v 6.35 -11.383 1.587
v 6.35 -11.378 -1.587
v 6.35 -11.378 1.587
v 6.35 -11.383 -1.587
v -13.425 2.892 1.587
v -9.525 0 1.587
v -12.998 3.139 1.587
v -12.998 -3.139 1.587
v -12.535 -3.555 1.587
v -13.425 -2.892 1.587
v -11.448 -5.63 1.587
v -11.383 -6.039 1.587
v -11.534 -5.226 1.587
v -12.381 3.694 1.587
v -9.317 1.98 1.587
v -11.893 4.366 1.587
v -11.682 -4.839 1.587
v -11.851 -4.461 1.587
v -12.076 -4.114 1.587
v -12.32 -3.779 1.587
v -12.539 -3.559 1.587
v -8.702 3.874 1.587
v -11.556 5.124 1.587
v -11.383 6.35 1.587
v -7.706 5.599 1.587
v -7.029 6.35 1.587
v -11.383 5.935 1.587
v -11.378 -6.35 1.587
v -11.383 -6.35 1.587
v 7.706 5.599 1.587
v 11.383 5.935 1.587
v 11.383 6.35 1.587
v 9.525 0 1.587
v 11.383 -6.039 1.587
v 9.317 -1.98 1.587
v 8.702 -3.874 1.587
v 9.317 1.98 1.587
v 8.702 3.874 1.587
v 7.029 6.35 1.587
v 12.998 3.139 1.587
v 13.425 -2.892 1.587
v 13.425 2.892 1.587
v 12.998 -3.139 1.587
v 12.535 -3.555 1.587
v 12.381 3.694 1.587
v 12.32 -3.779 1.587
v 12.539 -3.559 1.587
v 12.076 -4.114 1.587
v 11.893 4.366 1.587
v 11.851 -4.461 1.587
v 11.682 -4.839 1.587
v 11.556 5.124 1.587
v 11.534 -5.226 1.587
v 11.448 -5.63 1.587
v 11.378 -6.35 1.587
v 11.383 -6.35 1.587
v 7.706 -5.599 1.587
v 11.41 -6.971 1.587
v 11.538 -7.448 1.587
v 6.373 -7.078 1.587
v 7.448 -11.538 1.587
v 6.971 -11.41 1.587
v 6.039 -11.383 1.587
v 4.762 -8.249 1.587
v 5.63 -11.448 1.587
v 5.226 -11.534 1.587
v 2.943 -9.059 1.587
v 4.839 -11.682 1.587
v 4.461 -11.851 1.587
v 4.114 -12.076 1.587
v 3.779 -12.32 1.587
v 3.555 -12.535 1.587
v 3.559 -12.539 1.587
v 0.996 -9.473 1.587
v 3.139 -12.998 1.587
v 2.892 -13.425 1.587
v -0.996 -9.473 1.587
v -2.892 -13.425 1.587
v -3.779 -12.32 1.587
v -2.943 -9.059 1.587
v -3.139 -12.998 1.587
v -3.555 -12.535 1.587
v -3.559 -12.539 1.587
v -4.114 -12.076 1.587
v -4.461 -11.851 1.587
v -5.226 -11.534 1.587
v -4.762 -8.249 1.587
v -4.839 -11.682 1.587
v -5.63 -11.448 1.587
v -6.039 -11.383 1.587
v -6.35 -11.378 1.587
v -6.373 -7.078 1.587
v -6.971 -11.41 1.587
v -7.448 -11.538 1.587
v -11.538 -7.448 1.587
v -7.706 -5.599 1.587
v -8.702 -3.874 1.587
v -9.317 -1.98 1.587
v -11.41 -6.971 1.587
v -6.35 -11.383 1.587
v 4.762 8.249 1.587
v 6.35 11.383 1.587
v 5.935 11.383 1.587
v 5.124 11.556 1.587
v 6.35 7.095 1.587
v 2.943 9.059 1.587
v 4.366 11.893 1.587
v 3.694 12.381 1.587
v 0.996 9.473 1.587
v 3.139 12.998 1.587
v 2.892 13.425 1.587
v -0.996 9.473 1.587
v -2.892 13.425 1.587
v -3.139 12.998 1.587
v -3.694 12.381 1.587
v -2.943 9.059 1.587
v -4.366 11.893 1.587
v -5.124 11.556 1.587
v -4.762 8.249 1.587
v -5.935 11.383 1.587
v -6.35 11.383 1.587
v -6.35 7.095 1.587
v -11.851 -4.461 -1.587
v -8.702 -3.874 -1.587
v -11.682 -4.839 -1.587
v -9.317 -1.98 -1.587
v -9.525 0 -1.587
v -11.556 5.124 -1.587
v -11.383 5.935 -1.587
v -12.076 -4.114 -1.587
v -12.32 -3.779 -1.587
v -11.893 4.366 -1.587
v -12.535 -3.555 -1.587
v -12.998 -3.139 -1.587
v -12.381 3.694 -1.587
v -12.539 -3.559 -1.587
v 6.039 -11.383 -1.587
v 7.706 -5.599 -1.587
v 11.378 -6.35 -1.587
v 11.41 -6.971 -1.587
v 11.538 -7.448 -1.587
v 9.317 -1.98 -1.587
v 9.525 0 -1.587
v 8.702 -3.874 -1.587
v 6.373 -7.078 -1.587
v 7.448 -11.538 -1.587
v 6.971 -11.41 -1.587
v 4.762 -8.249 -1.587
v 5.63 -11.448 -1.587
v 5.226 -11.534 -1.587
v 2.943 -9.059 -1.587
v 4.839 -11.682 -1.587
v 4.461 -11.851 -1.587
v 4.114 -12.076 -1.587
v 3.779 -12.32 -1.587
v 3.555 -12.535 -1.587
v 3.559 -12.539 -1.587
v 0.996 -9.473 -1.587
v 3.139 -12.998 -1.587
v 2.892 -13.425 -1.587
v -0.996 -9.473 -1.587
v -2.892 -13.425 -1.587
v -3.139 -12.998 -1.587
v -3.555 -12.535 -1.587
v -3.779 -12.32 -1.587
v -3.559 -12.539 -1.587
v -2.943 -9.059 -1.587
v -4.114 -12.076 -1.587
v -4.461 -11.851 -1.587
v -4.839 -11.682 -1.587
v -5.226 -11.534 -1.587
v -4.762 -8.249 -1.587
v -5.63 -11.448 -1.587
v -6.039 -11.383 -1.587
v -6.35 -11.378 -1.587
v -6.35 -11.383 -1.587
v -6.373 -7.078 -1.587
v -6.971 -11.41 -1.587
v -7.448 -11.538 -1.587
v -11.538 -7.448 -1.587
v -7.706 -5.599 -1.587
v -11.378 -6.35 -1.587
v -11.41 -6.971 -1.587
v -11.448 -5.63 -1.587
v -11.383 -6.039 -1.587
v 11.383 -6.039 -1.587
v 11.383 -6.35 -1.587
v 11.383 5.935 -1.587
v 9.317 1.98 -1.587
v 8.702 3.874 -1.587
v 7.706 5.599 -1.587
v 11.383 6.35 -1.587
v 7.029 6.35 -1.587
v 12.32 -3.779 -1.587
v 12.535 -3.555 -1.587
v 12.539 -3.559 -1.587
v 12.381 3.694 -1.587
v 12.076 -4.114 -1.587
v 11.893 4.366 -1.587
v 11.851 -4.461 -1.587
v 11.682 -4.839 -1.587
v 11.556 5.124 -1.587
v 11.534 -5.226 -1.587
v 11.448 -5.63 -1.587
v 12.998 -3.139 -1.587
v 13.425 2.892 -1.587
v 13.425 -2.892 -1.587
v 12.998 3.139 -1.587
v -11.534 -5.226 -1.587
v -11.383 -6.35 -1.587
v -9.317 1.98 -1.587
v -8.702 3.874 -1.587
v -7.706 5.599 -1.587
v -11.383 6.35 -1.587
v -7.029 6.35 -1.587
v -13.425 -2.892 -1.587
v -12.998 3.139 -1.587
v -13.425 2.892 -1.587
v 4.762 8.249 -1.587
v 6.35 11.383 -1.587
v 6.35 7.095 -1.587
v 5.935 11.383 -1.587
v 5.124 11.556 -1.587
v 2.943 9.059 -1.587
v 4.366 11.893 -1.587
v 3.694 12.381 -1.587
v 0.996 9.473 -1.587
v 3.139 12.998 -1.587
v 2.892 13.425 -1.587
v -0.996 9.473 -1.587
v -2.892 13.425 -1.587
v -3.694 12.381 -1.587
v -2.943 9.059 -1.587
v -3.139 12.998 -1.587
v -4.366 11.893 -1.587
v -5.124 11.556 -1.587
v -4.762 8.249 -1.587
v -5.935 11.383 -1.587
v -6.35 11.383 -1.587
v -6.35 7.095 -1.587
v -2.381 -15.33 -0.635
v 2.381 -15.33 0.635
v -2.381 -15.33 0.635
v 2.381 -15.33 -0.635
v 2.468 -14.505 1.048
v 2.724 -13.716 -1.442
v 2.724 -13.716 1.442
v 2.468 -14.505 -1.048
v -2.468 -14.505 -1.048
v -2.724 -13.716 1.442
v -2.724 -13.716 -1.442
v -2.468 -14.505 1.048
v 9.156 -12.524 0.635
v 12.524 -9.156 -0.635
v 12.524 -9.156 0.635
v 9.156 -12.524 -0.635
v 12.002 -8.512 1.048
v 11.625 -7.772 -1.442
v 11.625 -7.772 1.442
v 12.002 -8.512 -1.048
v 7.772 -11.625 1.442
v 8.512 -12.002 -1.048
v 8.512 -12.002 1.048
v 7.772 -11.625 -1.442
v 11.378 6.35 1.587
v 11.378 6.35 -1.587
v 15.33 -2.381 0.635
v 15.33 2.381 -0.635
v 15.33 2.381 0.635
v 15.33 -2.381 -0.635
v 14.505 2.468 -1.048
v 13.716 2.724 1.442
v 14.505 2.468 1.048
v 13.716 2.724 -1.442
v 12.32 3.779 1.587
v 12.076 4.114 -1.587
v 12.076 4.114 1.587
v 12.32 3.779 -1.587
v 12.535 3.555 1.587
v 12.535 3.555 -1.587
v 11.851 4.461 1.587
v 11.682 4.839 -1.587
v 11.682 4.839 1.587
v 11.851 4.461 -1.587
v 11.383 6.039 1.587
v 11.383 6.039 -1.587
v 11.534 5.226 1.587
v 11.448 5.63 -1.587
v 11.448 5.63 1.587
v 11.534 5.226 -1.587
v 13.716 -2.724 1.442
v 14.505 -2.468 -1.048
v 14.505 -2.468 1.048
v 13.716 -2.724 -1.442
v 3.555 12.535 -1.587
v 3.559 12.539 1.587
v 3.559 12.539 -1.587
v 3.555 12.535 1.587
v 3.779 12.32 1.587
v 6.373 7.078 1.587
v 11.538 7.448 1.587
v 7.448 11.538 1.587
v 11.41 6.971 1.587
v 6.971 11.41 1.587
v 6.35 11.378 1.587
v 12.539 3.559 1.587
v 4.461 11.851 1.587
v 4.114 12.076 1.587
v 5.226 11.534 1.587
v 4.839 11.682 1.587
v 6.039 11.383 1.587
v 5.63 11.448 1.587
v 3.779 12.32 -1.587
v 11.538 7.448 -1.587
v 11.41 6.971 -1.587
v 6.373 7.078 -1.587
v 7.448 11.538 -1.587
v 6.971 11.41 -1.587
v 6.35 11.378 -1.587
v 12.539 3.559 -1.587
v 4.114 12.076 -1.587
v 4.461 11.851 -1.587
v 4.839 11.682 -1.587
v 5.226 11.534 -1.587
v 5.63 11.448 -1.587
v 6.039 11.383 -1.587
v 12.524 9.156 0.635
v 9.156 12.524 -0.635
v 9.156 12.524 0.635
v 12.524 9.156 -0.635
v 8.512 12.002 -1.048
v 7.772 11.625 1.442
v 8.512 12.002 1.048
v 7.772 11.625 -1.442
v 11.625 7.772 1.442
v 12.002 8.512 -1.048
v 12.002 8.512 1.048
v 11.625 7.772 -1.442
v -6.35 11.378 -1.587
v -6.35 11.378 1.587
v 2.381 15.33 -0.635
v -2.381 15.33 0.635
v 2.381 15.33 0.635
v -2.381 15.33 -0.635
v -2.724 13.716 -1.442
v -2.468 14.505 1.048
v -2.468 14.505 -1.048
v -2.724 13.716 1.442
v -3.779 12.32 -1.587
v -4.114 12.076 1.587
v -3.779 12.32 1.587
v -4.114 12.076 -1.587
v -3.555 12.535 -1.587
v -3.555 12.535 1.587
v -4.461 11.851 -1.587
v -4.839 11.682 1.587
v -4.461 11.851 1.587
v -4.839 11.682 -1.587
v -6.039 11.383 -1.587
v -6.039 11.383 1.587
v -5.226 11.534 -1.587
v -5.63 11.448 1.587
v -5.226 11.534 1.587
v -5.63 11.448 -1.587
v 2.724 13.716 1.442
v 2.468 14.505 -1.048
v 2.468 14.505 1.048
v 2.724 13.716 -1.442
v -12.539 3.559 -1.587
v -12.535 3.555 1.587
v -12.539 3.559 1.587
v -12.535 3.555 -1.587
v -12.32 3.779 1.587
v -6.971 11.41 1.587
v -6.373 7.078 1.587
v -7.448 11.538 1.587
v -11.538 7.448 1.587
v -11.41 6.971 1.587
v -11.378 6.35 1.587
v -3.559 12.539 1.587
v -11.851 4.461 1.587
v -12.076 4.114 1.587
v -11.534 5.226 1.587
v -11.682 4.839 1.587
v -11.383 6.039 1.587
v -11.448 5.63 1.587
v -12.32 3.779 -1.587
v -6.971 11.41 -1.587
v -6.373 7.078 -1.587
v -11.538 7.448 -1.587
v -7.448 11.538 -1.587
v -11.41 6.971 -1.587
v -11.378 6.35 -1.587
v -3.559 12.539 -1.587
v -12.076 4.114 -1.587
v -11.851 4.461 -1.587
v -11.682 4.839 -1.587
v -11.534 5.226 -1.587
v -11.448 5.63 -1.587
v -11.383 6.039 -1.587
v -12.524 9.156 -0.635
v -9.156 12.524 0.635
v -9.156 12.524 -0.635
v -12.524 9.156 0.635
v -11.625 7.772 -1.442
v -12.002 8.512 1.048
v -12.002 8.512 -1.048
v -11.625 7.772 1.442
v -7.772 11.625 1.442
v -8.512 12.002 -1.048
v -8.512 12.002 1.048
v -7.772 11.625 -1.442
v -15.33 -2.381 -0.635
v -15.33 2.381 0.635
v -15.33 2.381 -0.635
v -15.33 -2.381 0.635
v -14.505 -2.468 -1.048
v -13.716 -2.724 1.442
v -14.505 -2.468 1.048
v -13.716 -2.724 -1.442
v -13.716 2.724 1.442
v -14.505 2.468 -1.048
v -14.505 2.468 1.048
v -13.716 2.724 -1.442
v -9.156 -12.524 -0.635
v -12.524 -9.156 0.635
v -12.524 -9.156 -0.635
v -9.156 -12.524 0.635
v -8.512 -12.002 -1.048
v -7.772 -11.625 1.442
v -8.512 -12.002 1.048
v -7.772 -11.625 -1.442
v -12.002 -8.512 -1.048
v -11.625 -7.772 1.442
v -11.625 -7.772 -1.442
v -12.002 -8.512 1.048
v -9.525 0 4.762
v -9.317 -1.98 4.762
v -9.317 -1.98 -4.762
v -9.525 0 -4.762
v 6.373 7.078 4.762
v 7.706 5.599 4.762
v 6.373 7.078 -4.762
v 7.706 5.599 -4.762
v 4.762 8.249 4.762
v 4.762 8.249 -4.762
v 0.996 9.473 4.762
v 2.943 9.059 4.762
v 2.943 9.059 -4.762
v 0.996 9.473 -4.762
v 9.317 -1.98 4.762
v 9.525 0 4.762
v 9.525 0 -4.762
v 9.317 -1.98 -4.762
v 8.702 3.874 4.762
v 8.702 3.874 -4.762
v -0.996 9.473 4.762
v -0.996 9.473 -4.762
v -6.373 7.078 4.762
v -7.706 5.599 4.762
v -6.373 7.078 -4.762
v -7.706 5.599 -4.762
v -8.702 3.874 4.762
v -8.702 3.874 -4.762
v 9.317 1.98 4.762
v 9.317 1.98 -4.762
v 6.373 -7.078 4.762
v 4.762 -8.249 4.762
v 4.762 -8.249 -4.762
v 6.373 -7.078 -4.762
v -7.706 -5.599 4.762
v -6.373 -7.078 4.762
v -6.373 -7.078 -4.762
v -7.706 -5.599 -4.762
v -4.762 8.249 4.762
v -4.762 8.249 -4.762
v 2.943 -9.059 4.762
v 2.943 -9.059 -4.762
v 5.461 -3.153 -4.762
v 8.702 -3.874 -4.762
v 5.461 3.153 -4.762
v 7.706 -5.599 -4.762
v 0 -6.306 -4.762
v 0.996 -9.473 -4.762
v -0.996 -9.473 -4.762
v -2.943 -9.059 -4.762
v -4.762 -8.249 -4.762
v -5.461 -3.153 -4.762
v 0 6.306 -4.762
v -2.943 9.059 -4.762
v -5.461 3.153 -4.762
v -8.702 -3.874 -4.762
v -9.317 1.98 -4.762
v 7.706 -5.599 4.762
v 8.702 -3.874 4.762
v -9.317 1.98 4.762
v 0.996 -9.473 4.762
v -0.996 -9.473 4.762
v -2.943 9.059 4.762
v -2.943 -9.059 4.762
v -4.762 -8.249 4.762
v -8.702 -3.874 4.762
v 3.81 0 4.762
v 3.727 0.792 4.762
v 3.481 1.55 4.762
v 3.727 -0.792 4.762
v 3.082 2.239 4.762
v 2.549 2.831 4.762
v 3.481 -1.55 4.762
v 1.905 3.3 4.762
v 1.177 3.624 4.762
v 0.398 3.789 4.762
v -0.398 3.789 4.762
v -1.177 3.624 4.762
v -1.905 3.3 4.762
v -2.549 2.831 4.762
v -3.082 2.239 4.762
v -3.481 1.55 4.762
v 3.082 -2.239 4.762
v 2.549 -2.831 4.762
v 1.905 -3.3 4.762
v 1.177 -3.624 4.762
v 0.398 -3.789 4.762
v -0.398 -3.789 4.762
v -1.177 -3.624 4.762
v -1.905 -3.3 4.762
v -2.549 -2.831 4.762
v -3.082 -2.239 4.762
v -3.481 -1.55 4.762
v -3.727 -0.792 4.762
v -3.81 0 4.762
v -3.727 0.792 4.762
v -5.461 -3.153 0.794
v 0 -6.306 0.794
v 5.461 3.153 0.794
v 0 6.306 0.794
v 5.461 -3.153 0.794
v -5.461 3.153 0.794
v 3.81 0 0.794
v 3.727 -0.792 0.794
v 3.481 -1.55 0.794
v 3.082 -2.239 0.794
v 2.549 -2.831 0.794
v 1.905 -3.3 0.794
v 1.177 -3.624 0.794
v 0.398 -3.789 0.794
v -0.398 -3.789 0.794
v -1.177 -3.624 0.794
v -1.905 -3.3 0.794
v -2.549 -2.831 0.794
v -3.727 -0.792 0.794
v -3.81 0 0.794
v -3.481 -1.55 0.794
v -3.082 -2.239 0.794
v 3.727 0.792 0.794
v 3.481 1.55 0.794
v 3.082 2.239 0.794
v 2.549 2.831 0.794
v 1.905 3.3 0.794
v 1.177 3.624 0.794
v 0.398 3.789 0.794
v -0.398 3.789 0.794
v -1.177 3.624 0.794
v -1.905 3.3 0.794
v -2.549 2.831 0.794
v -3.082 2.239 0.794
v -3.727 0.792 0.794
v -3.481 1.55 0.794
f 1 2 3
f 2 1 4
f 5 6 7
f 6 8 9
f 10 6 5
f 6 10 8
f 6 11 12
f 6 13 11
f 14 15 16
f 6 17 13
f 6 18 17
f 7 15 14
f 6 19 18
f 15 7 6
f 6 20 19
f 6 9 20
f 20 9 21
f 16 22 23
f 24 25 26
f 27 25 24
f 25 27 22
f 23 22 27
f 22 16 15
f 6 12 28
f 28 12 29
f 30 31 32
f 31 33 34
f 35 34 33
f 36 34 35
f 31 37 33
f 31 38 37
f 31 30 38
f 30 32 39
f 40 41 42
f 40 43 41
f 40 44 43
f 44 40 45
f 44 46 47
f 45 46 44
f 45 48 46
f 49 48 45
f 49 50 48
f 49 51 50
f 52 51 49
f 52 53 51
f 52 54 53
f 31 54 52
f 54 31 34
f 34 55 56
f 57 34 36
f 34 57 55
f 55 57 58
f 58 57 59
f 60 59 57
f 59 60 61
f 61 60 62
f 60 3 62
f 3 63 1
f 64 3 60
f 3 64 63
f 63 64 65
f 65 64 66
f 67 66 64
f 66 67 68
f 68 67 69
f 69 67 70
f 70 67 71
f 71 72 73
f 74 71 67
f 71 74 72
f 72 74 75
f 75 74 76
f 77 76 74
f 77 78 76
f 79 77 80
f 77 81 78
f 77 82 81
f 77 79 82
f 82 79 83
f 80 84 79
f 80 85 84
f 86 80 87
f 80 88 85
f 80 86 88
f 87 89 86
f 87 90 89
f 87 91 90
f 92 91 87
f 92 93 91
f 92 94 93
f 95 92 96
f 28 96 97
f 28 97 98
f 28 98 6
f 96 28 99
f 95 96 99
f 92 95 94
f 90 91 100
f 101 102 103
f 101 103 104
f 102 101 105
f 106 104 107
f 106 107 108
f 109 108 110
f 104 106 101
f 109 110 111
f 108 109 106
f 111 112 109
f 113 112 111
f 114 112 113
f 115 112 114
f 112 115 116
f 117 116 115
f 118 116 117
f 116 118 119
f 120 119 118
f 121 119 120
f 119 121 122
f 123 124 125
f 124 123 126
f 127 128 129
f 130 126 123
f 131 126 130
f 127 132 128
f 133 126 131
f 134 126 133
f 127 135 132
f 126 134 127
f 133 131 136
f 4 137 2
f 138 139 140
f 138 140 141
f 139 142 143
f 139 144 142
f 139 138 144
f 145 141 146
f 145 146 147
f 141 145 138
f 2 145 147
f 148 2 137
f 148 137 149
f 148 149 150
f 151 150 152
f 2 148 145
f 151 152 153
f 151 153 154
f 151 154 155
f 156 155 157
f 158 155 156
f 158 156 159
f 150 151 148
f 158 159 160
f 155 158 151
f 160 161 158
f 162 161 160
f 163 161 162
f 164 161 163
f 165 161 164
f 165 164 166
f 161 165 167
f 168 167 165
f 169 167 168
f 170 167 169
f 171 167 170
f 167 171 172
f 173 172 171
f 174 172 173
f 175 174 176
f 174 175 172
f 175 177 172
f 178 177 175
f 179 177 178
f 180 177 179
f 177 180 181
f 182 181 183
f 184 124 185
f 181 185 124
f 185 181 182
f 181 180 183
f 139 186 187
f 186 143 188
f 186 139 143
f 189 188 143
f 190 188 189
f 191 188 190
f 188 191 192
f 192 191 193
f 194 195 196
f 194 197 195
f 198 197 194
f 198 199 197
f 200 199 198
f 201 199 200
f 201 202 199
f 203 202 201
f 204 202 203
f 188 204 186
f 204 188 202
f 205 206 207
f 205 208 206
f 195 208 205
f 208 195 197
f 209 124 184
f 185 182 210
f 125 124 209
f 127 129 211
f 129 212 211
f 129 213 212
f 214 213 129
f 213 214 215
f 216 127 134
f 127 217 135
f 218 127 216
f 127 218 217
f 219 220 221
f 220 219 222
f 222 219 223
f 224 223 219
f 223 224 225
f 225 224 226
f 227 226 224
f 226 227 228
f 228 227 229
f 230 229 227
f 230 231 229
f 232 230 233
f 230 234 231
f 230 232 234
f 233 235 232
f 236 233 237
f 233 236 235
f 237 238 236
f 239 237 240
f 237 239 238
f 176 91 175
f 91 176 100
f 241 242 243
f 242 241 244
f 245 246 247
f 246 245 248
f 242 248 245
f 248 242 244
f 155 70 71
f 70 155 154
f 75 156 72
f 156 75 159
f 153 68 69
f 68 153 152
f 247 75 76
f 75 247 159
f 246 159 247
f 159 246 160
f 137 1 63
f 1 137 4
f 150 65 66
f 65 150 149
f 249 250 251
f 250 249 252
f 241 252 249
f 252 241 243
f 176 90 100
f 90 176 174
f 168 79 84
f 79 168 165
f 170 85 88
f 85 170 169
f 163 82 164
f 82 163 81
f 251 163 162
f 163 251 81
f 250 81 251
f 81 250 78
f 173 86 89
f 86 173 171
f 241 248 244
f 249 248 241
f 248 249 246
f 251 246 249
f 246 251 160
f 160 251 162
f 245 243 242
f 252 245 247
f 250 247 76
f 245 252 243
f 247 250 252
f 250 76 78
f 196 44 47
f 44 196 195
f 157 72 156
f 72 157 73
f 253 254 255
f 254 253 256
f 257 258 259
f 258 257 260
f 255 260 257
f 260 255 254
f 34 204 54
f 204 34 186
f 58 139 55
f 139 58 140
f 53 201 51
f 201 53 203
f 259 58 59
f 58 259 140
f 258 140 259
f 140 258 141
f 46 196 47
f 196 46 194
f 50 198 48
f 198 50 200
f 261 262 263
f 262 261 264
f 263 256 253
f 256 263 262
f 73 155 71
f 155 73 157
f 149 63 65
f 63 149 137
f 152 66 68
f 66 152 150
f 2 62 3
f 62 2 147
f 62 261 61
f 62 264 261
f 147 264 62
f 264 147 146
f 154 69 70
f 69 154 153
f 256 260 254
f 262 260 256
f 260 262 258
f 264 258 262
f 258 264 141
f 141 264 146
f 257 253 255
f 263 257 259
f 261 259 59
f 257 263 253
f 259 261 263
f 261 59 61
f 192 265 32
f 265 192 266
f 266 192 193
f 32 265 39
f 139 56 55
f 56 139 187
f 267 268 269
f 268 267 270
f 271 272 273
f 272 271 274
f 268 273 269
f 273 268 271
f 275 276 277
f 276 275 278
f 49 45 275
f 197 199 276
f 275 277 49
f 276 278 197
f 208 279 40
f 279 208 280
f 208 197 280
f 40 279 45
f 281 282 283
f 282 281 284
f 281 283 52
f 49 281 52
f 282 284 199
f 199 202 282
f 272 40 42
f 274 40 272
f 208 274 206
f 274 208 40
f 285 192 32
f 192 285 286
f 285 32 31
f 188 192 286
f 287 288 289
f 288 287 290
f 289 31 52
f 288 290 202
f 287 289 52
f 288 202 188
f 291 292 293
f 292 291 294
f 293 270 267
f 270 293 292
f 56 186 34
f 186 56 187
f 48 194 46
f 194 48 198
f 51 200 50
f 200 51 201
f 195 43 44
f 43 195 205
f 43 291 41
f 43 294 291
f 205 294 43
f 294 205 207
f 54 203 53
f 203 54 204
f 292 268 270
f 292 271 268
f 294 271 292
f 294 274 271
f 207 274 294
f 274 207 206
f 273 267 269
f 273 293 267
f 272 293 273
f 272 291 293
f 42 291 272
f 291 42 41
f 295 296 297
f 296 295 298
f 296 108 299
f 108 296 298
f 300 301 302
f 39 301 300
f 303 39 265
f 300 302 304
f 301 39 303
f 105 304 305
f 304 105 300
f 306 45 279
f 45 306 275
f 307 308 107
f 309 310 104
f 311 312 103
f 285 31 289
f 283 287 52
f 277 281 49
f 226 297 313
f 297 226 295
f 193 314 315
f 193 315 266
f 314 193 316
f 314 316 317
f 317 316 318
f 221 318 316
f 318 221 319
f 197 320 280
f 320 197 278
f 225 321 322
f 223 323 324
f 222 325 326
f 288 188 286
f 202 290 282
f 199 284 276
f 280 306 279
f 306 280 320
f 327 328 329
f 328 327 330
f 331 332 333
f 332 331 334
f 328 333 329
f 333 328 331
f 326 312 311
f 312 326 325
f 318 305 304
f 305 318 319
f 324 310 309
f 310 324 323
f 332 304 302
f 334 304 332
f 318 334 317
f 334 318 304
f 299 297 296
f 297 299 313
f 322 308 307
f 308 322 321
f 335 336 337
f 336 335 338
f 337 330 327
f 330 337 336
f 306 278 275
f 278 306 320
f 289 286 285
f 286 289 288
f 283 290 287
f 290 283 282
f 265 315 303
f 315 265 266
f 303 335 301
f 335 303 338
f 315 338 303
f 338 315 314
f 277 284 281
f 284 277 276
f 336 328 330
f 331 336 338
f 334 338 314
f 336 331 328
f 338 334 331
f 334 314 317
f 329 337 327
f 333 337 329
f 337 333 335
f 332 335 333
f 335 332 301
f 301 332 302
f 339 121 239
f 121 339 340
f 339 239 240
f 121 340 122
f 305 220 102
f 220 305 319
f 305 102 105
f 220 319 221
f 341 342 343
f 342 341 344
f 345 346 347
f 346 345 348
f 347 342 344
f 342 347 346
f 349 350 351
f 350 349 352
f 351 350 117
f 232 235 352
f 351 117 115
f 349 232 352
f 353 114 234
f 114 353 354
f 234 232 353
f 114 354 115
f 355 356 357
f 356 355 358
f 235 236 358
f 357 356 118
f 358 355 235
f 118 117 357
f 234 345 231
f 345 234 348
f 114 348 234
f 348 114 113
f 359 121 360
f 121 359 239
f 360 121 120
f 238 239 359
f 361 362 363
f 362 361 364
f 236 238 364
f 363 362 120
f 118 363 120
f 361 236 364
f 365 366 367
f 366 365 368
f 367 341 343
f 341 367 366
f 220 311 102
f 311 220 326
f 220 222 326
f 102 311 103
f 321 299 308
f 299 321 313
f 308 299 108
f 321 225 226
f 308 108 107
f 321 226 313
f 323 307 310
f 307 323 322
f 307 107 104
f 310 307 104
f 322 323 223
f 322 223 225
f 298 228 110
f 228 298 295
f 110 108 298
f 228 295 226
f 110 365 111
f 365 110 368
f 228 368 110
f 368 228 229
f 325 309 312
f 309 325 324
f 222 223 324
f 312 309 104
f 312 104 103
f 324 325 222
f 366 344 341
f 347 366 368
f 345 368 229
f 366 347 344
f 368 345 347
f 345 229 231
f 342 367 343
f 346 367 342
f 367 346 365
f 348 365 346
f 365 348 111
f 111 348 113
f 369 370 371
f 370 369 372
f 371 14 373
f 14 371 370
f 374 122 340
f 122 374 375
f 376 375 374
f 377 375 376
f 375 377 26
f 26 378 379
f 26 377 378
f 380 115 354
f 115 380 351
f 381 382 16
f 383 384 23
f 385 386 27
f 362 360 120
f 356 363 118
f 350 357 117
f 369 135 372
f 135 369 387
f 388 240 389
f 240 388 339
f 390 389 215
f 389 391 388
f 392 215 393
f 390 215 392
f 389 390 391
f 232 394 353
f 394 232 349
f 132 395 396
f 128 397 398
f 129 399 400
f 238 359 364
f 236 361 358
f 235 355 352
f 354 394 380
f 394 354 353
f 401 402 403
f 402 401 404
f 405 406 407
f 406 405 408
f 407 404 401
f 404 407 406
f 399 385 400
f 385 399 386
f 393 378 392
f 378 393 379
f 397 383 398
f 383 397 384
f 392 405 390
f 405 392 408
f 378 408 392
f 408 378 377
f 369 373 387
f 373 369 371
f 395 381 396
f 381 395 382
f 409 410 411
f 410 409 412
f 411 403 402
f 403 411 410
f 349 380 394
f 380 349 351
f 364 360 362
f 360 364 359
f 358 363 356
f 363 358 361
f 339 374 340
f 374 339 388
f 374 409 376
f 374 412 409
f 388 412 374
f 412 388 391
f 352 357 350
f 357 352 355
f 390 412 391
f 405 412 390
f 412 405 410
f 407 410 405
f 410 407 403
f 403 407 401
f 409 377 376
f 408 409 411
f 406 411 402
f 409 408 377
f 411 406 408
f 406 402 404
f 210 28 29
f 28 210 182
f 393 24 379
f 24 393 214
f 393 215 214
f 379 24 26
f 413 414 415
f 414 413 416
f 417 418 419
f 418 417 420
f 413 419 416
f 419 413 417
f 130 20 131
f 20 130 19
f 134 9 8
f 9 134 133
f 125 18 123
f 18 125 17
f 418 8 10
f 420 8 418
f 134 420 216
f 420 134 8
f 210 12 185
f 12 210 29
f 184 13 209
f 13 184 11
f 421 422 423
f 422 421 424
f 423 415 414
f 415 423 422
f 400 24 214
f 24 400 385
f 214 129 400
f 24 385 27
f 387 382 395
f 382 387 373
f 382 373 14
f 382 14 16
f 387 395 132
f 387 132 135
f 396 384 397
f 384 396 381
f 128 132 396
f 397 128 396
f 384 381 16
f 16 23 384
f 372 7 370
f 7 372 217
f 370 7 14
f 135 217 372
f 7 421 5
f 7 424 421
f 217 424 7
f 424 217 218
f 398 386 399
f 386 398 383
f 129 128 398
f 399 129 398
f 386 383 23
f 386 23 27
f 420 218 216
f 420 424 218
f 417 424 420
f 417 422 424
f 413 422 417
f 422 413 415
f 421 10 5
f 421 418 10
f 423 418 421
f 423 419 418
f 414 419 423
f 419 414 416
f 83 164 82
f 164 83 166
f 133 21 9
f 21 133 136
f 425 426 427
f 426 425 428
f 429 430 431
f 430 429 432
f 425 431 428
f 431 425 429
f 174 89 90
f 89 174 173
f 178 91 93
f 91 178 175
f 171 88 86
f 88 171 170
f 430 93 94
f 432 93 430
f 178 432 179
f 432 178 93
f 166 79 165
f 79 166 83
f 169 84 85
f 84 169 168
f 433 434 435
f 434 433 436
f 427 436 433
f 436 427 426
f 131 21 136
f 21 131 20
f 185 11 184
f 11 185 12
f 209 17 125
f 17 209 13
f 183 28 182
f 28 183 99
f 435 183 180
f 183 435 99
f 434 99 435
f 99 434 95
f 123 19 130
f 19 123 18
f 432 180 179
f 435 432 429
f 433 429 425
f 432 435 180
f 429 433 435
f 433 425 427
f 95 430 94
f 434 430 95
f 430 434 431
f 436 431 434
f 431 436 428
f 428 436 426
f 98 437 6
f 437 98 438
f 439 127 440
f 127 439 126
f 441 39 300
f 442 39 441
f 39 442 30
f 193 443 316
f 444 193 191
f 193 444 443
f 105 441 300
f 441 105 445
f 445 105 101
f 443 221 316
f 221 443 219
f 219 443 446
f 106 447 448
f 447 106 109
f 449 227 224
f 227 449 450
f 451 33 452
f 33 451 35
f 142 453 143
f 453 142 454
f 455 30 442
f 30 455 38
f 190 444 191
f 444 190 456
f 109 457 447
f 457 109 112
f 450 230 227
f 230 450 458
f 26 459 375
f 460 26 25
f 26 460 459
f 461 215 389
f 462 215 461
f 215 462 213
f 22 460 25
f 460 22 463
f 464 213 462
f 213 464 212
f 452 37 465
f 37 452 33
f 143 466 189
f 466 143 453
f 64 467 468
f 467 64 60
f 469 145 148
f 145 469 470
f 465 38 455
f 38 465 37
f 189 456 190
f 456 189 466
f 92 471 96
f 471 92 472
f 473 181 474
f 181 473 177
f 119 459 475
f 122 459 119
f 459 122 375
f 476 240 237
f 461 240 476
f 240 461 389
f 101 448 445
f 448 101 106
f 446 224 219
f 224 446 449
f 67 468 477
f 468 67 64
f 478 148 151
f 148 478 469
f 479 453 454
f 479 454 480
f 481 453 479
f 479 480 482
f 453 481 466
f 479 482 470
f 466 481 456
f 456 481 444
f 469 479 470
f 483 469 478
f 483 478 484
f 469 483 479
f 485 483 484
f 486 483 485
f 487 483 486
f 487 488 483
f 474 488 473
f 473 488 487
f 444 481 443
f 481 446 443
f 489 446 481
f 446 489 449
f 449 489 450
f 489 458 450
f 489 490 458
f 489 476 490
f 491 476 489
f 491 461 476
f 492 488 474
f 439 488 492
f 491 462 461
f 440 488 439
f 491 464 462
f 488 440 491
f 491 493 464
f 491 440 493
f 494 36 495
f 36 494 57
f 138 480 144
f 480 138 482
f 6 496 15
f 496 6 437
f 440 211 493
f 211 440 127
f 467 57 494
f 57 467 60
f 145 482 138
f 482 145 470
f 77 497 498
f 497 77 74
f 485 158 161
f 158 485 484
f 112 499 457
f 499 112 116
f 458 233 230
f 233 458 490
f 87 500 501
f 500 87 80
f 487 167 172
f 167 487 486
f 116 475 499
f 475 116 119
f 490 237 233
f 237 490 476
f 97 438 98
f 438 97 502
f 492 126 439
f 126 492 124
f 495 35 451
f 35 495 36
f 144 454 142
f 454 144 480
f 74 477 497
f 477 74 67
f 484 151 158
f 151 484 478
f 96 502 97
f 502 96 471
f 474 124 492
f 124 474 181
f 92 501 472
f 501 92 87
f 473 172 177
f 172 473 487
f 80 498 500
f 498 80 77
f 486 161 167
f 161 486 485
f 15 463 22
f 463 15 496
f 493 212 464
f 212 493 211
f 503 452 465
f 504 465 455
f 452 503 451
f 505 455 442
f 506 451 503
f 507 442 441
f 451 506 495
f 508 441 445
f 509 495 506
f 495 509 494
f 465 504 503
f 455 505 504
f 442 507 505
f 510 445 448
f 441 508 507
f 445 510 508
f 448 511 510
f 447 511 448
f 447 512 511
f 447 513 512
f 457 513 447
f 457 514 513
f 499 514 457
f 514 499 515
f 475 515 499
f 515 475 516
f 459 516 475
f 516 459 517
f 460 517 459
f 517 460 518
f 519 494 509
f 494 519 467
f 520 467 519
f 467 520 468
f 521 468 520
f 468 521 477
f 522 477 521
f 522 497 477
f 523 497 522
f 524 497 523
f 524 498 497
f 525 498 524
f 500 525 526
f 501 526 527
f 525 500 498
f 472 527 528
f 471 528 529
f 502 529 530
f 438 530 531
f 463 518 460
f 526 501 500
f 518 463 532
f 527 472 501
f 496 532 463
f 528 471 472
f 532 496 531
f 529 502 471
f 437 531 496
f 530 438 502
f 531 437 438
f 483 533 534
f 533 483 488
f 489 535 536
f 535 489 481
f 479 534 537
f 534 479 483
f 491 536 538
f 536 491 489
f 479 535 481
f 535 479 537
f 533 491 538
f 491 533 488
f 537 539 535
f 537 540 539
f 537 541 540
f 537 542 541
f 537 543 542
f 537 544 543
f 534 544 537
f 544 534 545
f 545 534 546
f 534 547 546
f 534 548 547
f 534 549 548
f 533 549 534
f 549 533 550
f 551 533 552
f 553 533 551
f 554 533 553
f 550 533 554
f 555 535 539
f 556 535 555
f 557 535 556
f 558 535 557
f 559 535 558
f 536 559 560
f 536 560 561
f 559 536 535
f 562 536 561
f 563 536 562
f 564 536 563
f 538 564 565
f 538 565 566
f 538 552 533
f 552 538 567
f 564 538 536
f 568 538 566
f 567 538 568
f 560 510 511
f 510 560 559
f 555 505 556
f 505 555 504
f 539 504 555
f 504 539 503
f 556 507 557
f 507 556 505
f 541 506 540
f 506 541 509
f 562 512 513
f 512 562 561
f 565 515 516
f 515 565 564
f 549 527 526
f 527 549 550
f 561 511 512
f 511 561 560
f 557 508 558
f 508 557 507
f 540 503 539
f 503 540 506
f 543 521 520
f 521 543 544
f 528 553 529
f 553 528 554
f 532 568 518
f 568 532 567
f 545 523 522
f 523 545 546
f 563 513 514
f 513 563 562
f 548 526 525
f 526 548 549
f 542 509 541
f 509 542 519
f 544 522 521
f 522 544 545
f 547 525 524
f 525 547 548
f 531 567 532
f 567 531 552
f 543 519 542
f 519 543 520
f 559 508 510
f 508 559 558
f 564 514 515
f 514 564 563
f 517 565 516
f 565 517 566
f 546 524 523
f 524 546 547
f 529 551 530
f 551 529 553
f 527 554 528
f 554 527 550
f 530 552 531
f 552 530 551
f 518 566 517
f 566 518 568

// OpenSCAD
/* http://www.thingiverse.com/thing:426854 */

module sprocket_tooth() {
    s = 1;
    intersection() {
        difference() {
            translate([-1/4,0,-1/16])
                cube([1/2,3/8,1/8]);
            translate([1/4, 0, -1/8])
                cylinder(h=1/4, d=5/16, $fn=30);
            translate([-1/4, 0, -1/8])
                cylinder(h=1/4, d=5/16, $fn=30);
        }
        translate([0, -0.05, 0])
            scale([1, 1, 0.5])
                rotate([-45, 0, 0])
                    translate([-1/2, 0, 0])
                        cube([1, 1, 1]);
    }
}

module sprocket(teeth, hub_diameter) {
    pitch = 1/2;   // bicycle chain, 1/2 - 1/8
    theta = 360.0 / teeth;
    r = (pitch / 2) / tan(theta / 2);
    for (i = [0 : teeth-1])
        rotate(theta*i, [0, 0, 1])
            translate([0, -r, 0]) sprocket_tooth();
    translate([0,0,-1/16])
        cylinder(h=1/8, d=2*r-0.5, $fn=30);
    translate([0,0,-3/16])
        cylinder(h=3/8, d=hub_diameter, $fn=30);
}

module StepperSprocket(teeth, axle_diameter) {
    dcut = 0.5 * (0.21/0.250) * axle_diameter;
    difference() {
        union() {
            sprocket(teeth, 0.5);
            translate([0, 0, -5/16])
                cylinder(h=5/16, d=0.5, $fn=30);
        }
        difference() {
            translate([0,0,-0.5])
                cylinder(h=1, r=axle_diameter/2, $fn=30);
            translate([dcut, -0.5, -0.5])
                cube([1, 1, 1]);
        }
        translate([0, 0, -3/16])
            rotate([0, 90, 0])
                cylinder(h=1, d=3/32, $fn=30);
    }
}

module HexNutSprocket(teeth, wrench_size) {
    difference() {
        sprocket(teeth, 0.75);
        intersection_for(n = [1 : 3])
            rotate(60 * n, [0, 0, 1])
                translate([-0.5 * wrench_size, -0.5, -0.5])
                    cube([wrench_size, 1, 1]);
    }
    difference() {
        translate([0, 0, 1/32])
            cylinder(h=5/32, d=0.75, $fn=30);
        cylinder(h=1, d=0.3, $fn=30);
    }
}

teeth = 8;
wrench_size = 0.43;

/* STL files are dimensionless and I usually like to use inches,
 * but the Formlabs machine prefers millimeters, and OpenSCAD
 * seems to want them also.
 */

scale([25.4, 25.4, 25.4]) {
    // StepperSprocket(teeth, 1/4);

    HexNutSprocket(teeth, wrench_size);
}
